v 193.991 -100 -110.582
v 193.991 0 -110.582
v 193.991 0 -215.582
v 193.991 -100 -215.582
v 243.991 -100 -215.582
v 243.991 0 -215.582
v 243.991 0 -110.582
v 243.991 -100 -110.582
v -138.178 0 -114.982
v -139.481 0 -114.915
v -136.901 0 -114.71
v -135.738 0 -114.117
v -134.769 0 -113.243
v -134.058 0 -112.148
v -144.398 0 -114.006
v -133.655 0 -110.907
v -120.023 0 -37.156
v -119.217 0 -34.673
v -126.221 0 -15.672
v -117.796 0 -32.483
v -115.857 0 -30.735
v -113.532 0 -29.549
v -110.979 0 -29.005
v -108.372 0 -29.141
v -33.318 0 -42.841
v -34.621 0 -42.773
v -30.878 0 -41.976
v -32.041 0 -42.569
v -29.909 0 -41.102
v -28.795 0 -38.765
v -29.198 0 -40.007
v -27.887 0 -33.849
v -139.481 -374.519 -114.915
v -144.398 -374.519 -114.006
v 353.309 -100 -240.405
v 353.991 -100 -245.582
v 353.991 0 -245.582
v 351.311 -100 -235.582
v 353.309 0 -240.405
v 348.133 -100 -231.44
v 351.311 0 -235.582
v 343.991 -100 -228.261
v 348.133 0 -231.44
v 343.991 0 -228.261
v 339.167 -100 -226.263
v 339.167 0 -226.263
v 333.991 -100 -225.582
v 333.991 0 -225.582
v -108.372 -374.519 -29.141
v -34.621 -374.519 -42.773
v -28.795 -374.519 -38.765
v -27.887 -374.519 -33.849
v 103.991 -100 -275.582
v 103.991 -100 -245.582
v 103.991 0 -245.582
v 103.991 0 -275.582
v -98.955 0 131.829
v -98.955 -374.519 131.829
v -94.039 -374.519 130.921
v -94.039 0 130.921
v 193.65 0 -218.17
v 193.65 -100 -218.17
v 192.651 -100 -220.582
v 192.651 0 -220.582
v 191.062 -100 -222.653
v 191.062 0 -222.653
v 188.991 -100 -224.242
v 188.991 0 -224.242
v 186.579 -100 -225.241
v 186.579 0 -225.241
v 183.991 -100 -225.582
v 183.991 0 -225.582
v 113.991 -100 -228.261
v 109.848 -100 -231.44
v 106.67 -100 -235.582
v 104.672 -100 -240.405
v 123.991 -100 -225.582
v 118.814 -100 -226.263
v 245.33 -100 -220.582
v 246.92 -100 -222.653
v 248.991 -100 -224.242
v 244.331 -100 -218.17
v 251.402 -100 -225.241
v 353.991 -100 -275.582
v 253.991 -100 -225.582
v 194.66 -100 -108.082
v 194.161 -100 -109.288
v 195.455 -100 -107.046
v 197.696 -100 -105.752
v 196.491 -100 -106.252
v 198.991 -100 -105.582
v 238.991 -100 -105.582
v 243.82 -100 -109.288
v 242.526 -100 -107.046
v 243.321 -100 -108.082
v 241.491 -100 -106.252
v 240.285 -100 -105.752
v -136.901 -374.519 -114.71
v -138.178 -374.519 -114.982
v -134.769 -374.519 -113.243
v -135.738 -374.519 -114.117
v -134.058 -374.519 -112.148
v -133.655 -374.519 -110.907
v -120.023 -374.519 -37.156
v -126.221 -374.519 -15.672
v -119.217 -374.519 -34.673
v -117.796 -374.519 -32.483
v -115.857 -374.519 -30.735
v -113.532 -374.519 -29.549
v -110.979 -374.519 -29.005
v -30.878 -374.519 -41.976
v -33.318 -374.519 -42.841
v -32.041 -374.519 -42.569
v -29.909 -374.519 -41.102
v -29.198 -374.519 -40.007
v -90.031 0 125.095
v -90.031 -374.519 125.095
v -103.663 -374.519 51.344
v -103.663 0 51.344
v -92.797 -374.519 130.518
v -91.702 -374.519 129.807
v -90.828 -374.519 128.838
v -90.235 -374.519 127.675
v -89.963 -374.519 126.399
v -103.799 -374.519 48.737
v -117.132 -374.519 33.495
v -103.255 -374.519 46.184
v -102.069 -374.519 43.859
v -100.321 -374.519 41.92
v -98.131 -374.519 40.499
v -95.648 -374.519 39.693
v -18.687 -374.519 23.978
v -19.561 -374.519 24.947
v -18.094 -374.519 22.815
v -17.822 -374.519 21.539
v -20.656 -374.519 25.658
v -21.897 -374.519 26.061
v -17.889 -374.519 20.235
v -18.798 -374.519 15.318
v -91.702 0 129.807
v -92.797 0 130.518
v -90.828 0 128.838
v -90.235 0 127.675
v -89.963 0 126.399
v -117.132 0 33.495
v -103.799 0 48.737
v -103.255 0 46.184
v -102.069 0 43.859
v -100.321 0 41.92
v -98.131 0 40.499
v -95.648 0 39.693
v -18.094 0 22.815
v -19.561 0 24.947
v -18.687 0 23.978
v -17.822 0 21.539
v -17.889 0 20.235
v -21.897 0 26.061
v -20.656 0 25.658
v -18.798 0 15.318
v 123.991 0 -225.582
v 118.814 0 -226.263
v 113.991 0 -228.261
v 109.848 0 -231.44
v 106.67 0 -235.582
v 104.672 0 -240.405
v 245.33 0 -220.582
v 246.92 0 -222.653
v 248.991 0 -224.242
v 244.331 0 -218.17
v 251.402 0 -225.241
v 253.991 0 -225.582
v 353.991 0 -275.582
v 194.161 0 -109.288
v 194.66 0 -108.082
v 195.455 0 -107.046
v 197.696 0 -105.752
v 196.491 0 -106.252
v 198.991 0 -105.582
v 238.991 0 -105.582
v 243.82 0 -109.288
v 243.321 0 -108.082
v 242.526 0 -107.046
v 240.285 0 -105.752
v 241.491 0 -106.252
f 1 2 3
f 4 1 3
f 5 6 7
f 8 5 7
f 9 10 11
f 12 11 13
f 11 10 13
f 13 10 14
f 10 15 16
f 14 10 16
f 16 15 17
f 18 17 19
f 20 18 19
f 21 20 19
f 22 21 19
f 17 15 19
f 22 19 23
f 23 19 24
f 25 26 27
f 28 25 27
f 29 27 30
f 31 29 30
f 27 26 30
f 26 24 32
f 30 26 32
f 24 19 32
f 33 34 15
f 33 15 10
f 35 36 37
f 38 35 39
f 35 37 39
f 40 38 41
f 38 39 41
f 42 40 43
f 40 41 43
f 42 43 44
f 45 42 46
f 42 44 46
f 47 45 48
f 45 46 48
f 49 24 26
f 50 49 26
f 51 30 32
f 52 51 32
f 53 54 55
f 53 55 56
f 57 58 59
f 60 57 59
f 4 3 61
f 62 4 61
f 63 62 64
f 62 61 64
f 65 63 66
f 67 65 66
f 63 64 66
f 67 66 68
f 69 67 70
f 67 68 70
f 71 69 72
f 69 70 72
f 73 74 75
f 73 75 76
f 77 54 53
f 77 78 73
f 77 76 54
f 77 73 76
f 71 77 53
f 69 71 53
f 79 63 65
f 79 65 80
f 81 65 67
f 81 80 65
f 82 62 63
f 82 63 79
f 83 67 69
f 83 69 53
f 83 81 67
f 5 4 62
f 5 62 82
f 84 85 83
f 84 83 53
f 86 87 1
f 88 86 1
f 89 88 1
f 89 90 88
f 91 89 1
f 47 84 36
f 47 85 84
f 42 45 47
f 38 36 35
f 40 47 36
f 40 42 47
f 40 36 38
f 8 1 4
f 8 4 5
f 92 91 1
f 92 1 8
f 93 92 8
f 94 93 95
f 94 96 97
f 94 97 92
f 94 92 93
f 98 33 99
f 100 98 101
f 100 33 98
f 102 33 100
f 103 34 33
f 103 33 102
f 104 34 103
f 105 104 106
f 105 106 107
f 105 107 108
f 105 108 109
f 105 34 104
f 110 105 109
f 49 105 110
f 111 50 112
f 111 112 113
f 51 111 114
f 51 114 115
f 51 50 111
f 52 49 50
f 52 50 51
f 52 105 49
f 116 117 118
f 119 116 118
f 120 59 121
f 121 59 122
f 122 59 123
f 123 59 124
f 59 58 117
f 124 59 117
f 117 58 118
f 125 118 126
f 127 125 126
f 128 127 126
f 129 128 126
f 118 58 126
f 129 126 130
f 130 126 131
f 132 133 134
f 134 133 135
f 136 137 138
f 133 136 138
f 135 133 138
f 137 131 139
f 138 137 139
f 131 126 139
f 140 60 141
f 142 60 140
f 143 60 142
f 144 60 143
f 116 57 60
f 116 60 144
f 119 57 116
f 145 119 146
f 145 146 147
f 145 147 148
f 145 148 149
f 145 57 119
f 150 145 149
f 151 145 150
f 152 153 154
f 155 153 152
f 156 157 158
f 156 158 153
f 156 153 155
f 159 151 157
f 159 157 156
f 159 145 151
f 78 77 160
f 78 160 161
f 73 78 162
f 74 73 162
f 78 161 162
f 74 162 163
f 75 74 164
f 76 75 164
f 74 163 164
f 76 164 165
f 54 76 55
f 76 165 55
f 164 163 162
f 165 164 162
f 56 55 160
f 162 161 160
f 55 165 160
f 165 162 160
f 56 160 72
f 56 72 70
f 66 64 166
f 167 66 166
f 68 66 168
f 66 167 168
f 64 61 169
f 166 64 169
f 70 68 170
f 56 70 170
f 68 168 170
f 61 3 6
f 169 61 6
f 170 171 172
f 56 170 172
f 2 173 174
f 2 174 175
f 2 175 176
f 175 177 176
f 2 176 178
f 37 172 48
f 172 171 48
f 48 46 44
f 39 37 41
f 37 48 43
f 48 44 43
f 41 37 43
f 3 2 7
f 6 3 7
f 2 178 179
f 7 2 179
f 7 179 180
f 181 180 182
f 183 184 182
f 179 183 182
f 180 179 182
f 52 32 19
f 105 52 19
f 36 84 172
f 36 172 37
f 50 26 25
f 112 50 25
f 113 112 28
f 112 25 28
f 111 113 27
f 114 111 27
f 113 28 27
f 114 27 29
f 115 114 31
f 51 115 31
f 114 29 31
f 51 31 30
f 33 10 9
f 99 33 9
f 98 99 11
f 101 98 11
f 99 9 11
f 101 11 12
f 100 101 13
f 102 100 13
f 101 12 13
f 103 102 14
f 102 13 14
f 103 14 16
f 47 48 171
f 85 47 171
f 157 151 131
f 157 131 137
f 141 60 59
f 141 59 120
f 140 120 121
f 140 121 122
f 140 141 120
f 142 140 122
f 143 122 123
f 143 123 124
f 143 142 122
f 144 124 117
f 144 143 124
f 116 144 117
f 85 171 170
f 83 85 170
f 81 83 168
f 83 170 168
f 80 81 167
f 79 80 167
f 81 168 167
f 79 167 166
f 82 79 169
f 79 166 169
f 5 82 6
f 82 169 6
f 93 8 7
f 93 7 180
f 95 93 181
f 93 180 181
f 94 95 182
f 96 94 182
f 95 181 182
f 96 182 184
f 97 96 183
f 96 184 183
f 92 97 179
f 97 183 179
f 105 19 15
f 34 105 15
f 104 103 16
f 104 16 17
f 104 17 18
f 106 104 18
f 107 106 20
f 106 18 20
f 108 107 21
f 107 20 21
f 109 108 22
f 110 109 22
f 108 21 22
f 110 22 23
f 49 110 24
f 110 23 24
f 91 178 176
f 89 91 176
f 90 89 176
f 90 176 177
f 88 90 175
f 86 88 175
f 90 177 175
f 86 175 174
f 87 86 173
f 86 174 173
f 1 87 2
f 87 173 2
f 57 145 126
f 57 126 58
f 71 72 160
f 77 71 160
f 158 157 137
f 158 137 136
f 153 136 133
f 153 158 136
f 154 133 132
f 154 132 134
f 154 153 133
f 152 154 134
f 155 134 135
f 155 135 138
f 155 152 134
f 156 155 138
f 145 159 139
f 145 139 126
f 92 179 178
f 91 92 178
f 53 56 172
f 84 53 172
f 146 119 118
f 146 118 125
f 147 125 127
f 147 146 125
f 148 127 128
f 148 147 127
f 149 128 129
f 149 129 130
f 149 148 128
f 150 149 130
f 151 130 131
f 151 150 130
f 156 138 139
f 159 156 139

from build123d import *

# Parameters (mm, degrees)
F2_DEPTH = 374.51905
F5_DEPTH = 100


with BuildPart() as f2:
    # F0 (on Front) → F2 (new body)
    with BuildSketch(Plane.XZ):
        with BuildLine():
            Line((-28.795463, -38.765425), (-27.886613, -33.84872))
            Line((-27.886613, -33.84872), (-126.220722, -15.67173))
            Line((-126.220722, -15.67173), (-144.397712, -114.005839))
            Line((-144.397712, -114.005839), (-139.481007, -114.914689))
            ThreePointArc((-139.481007, -114.914689), (-135.738175, -114.117273), (-133.655452, -110.906833))
            Line((-133.655452, -110.906833), (-120.022709, -37.156251))
            ThreePointArc((-120.022709, -37.156251), (-115.857263, -30.735371), (-108.371599, -29.140539))
            Line((-108.371599, -29.140539), (-34.621018, -42.773281))
            ThreePointArc((-34.621018, -42.773281), (-30.878186, -41.975865), (-28.795463, -38.765425))
        make_face()
    extrude(amount=F2_DEPTH)


with BuildPart() as f4_1:
    # F4: instance of F2
    add(f2.part.mirror(Plane(origin=(-72.50942, -187.259525, -0.176698), x_dir=(1, 0, 0), z_dir=(0.18177, 0, 0.983341))))


with BuildPart() as f5:
    # F1 (on Front) → F5 (new body)
    with BuildSketch(Plane.XZ):
        with BuildLine():
            Line((103.990591, -245.581819), (103.990591, -275.581819))
            Line((103.990591, -275.581819), (353.990591, -275.581819))
            Line((353.990591, -275.581819), (353.990591, -245.581819))
            ThreePointArc((353.990591, -245.581819), (348.132727, -231.439684), (333.990591, -225.581819))
            Line((333.990591, -225.581819), (253.990591, -225.581819))
            ThreePointArc((253.990591, -225.581819), (246.919523, -222.652887), (243.990591, -215.581819))
            Line((243.990591, -215.581819), (243.990591, -110.581819))
            ThreePointArc((243.990591, -110.581819), (242.526125, -107.046285), (238.990591, -105.581819))
            Line((238.990591, -105.581819), (198.990591, -105.581819))
            ThreePointArc((198.990591, -105.581819), (195.455057, -107.046285), (193.990591, -110.581819))
            Line((193.990591, -110.581819), (193.990591, -215.581819))
            ThreePointArc((193.990591, -215.581819), (191.061659, -222.652887), (183.990591, -225.581819))
            Line((183.990591, -225.581819), (123.990591, -225.581819))
            ThreePointArc((123.990591, -225.581819), (109.848456, -231.439684), (103.990591, -245.581819))
        make_face()
    extrude(amount=F5_DEPTH)


solid = Compound([f2.part, f4_1.part, f5.part])
